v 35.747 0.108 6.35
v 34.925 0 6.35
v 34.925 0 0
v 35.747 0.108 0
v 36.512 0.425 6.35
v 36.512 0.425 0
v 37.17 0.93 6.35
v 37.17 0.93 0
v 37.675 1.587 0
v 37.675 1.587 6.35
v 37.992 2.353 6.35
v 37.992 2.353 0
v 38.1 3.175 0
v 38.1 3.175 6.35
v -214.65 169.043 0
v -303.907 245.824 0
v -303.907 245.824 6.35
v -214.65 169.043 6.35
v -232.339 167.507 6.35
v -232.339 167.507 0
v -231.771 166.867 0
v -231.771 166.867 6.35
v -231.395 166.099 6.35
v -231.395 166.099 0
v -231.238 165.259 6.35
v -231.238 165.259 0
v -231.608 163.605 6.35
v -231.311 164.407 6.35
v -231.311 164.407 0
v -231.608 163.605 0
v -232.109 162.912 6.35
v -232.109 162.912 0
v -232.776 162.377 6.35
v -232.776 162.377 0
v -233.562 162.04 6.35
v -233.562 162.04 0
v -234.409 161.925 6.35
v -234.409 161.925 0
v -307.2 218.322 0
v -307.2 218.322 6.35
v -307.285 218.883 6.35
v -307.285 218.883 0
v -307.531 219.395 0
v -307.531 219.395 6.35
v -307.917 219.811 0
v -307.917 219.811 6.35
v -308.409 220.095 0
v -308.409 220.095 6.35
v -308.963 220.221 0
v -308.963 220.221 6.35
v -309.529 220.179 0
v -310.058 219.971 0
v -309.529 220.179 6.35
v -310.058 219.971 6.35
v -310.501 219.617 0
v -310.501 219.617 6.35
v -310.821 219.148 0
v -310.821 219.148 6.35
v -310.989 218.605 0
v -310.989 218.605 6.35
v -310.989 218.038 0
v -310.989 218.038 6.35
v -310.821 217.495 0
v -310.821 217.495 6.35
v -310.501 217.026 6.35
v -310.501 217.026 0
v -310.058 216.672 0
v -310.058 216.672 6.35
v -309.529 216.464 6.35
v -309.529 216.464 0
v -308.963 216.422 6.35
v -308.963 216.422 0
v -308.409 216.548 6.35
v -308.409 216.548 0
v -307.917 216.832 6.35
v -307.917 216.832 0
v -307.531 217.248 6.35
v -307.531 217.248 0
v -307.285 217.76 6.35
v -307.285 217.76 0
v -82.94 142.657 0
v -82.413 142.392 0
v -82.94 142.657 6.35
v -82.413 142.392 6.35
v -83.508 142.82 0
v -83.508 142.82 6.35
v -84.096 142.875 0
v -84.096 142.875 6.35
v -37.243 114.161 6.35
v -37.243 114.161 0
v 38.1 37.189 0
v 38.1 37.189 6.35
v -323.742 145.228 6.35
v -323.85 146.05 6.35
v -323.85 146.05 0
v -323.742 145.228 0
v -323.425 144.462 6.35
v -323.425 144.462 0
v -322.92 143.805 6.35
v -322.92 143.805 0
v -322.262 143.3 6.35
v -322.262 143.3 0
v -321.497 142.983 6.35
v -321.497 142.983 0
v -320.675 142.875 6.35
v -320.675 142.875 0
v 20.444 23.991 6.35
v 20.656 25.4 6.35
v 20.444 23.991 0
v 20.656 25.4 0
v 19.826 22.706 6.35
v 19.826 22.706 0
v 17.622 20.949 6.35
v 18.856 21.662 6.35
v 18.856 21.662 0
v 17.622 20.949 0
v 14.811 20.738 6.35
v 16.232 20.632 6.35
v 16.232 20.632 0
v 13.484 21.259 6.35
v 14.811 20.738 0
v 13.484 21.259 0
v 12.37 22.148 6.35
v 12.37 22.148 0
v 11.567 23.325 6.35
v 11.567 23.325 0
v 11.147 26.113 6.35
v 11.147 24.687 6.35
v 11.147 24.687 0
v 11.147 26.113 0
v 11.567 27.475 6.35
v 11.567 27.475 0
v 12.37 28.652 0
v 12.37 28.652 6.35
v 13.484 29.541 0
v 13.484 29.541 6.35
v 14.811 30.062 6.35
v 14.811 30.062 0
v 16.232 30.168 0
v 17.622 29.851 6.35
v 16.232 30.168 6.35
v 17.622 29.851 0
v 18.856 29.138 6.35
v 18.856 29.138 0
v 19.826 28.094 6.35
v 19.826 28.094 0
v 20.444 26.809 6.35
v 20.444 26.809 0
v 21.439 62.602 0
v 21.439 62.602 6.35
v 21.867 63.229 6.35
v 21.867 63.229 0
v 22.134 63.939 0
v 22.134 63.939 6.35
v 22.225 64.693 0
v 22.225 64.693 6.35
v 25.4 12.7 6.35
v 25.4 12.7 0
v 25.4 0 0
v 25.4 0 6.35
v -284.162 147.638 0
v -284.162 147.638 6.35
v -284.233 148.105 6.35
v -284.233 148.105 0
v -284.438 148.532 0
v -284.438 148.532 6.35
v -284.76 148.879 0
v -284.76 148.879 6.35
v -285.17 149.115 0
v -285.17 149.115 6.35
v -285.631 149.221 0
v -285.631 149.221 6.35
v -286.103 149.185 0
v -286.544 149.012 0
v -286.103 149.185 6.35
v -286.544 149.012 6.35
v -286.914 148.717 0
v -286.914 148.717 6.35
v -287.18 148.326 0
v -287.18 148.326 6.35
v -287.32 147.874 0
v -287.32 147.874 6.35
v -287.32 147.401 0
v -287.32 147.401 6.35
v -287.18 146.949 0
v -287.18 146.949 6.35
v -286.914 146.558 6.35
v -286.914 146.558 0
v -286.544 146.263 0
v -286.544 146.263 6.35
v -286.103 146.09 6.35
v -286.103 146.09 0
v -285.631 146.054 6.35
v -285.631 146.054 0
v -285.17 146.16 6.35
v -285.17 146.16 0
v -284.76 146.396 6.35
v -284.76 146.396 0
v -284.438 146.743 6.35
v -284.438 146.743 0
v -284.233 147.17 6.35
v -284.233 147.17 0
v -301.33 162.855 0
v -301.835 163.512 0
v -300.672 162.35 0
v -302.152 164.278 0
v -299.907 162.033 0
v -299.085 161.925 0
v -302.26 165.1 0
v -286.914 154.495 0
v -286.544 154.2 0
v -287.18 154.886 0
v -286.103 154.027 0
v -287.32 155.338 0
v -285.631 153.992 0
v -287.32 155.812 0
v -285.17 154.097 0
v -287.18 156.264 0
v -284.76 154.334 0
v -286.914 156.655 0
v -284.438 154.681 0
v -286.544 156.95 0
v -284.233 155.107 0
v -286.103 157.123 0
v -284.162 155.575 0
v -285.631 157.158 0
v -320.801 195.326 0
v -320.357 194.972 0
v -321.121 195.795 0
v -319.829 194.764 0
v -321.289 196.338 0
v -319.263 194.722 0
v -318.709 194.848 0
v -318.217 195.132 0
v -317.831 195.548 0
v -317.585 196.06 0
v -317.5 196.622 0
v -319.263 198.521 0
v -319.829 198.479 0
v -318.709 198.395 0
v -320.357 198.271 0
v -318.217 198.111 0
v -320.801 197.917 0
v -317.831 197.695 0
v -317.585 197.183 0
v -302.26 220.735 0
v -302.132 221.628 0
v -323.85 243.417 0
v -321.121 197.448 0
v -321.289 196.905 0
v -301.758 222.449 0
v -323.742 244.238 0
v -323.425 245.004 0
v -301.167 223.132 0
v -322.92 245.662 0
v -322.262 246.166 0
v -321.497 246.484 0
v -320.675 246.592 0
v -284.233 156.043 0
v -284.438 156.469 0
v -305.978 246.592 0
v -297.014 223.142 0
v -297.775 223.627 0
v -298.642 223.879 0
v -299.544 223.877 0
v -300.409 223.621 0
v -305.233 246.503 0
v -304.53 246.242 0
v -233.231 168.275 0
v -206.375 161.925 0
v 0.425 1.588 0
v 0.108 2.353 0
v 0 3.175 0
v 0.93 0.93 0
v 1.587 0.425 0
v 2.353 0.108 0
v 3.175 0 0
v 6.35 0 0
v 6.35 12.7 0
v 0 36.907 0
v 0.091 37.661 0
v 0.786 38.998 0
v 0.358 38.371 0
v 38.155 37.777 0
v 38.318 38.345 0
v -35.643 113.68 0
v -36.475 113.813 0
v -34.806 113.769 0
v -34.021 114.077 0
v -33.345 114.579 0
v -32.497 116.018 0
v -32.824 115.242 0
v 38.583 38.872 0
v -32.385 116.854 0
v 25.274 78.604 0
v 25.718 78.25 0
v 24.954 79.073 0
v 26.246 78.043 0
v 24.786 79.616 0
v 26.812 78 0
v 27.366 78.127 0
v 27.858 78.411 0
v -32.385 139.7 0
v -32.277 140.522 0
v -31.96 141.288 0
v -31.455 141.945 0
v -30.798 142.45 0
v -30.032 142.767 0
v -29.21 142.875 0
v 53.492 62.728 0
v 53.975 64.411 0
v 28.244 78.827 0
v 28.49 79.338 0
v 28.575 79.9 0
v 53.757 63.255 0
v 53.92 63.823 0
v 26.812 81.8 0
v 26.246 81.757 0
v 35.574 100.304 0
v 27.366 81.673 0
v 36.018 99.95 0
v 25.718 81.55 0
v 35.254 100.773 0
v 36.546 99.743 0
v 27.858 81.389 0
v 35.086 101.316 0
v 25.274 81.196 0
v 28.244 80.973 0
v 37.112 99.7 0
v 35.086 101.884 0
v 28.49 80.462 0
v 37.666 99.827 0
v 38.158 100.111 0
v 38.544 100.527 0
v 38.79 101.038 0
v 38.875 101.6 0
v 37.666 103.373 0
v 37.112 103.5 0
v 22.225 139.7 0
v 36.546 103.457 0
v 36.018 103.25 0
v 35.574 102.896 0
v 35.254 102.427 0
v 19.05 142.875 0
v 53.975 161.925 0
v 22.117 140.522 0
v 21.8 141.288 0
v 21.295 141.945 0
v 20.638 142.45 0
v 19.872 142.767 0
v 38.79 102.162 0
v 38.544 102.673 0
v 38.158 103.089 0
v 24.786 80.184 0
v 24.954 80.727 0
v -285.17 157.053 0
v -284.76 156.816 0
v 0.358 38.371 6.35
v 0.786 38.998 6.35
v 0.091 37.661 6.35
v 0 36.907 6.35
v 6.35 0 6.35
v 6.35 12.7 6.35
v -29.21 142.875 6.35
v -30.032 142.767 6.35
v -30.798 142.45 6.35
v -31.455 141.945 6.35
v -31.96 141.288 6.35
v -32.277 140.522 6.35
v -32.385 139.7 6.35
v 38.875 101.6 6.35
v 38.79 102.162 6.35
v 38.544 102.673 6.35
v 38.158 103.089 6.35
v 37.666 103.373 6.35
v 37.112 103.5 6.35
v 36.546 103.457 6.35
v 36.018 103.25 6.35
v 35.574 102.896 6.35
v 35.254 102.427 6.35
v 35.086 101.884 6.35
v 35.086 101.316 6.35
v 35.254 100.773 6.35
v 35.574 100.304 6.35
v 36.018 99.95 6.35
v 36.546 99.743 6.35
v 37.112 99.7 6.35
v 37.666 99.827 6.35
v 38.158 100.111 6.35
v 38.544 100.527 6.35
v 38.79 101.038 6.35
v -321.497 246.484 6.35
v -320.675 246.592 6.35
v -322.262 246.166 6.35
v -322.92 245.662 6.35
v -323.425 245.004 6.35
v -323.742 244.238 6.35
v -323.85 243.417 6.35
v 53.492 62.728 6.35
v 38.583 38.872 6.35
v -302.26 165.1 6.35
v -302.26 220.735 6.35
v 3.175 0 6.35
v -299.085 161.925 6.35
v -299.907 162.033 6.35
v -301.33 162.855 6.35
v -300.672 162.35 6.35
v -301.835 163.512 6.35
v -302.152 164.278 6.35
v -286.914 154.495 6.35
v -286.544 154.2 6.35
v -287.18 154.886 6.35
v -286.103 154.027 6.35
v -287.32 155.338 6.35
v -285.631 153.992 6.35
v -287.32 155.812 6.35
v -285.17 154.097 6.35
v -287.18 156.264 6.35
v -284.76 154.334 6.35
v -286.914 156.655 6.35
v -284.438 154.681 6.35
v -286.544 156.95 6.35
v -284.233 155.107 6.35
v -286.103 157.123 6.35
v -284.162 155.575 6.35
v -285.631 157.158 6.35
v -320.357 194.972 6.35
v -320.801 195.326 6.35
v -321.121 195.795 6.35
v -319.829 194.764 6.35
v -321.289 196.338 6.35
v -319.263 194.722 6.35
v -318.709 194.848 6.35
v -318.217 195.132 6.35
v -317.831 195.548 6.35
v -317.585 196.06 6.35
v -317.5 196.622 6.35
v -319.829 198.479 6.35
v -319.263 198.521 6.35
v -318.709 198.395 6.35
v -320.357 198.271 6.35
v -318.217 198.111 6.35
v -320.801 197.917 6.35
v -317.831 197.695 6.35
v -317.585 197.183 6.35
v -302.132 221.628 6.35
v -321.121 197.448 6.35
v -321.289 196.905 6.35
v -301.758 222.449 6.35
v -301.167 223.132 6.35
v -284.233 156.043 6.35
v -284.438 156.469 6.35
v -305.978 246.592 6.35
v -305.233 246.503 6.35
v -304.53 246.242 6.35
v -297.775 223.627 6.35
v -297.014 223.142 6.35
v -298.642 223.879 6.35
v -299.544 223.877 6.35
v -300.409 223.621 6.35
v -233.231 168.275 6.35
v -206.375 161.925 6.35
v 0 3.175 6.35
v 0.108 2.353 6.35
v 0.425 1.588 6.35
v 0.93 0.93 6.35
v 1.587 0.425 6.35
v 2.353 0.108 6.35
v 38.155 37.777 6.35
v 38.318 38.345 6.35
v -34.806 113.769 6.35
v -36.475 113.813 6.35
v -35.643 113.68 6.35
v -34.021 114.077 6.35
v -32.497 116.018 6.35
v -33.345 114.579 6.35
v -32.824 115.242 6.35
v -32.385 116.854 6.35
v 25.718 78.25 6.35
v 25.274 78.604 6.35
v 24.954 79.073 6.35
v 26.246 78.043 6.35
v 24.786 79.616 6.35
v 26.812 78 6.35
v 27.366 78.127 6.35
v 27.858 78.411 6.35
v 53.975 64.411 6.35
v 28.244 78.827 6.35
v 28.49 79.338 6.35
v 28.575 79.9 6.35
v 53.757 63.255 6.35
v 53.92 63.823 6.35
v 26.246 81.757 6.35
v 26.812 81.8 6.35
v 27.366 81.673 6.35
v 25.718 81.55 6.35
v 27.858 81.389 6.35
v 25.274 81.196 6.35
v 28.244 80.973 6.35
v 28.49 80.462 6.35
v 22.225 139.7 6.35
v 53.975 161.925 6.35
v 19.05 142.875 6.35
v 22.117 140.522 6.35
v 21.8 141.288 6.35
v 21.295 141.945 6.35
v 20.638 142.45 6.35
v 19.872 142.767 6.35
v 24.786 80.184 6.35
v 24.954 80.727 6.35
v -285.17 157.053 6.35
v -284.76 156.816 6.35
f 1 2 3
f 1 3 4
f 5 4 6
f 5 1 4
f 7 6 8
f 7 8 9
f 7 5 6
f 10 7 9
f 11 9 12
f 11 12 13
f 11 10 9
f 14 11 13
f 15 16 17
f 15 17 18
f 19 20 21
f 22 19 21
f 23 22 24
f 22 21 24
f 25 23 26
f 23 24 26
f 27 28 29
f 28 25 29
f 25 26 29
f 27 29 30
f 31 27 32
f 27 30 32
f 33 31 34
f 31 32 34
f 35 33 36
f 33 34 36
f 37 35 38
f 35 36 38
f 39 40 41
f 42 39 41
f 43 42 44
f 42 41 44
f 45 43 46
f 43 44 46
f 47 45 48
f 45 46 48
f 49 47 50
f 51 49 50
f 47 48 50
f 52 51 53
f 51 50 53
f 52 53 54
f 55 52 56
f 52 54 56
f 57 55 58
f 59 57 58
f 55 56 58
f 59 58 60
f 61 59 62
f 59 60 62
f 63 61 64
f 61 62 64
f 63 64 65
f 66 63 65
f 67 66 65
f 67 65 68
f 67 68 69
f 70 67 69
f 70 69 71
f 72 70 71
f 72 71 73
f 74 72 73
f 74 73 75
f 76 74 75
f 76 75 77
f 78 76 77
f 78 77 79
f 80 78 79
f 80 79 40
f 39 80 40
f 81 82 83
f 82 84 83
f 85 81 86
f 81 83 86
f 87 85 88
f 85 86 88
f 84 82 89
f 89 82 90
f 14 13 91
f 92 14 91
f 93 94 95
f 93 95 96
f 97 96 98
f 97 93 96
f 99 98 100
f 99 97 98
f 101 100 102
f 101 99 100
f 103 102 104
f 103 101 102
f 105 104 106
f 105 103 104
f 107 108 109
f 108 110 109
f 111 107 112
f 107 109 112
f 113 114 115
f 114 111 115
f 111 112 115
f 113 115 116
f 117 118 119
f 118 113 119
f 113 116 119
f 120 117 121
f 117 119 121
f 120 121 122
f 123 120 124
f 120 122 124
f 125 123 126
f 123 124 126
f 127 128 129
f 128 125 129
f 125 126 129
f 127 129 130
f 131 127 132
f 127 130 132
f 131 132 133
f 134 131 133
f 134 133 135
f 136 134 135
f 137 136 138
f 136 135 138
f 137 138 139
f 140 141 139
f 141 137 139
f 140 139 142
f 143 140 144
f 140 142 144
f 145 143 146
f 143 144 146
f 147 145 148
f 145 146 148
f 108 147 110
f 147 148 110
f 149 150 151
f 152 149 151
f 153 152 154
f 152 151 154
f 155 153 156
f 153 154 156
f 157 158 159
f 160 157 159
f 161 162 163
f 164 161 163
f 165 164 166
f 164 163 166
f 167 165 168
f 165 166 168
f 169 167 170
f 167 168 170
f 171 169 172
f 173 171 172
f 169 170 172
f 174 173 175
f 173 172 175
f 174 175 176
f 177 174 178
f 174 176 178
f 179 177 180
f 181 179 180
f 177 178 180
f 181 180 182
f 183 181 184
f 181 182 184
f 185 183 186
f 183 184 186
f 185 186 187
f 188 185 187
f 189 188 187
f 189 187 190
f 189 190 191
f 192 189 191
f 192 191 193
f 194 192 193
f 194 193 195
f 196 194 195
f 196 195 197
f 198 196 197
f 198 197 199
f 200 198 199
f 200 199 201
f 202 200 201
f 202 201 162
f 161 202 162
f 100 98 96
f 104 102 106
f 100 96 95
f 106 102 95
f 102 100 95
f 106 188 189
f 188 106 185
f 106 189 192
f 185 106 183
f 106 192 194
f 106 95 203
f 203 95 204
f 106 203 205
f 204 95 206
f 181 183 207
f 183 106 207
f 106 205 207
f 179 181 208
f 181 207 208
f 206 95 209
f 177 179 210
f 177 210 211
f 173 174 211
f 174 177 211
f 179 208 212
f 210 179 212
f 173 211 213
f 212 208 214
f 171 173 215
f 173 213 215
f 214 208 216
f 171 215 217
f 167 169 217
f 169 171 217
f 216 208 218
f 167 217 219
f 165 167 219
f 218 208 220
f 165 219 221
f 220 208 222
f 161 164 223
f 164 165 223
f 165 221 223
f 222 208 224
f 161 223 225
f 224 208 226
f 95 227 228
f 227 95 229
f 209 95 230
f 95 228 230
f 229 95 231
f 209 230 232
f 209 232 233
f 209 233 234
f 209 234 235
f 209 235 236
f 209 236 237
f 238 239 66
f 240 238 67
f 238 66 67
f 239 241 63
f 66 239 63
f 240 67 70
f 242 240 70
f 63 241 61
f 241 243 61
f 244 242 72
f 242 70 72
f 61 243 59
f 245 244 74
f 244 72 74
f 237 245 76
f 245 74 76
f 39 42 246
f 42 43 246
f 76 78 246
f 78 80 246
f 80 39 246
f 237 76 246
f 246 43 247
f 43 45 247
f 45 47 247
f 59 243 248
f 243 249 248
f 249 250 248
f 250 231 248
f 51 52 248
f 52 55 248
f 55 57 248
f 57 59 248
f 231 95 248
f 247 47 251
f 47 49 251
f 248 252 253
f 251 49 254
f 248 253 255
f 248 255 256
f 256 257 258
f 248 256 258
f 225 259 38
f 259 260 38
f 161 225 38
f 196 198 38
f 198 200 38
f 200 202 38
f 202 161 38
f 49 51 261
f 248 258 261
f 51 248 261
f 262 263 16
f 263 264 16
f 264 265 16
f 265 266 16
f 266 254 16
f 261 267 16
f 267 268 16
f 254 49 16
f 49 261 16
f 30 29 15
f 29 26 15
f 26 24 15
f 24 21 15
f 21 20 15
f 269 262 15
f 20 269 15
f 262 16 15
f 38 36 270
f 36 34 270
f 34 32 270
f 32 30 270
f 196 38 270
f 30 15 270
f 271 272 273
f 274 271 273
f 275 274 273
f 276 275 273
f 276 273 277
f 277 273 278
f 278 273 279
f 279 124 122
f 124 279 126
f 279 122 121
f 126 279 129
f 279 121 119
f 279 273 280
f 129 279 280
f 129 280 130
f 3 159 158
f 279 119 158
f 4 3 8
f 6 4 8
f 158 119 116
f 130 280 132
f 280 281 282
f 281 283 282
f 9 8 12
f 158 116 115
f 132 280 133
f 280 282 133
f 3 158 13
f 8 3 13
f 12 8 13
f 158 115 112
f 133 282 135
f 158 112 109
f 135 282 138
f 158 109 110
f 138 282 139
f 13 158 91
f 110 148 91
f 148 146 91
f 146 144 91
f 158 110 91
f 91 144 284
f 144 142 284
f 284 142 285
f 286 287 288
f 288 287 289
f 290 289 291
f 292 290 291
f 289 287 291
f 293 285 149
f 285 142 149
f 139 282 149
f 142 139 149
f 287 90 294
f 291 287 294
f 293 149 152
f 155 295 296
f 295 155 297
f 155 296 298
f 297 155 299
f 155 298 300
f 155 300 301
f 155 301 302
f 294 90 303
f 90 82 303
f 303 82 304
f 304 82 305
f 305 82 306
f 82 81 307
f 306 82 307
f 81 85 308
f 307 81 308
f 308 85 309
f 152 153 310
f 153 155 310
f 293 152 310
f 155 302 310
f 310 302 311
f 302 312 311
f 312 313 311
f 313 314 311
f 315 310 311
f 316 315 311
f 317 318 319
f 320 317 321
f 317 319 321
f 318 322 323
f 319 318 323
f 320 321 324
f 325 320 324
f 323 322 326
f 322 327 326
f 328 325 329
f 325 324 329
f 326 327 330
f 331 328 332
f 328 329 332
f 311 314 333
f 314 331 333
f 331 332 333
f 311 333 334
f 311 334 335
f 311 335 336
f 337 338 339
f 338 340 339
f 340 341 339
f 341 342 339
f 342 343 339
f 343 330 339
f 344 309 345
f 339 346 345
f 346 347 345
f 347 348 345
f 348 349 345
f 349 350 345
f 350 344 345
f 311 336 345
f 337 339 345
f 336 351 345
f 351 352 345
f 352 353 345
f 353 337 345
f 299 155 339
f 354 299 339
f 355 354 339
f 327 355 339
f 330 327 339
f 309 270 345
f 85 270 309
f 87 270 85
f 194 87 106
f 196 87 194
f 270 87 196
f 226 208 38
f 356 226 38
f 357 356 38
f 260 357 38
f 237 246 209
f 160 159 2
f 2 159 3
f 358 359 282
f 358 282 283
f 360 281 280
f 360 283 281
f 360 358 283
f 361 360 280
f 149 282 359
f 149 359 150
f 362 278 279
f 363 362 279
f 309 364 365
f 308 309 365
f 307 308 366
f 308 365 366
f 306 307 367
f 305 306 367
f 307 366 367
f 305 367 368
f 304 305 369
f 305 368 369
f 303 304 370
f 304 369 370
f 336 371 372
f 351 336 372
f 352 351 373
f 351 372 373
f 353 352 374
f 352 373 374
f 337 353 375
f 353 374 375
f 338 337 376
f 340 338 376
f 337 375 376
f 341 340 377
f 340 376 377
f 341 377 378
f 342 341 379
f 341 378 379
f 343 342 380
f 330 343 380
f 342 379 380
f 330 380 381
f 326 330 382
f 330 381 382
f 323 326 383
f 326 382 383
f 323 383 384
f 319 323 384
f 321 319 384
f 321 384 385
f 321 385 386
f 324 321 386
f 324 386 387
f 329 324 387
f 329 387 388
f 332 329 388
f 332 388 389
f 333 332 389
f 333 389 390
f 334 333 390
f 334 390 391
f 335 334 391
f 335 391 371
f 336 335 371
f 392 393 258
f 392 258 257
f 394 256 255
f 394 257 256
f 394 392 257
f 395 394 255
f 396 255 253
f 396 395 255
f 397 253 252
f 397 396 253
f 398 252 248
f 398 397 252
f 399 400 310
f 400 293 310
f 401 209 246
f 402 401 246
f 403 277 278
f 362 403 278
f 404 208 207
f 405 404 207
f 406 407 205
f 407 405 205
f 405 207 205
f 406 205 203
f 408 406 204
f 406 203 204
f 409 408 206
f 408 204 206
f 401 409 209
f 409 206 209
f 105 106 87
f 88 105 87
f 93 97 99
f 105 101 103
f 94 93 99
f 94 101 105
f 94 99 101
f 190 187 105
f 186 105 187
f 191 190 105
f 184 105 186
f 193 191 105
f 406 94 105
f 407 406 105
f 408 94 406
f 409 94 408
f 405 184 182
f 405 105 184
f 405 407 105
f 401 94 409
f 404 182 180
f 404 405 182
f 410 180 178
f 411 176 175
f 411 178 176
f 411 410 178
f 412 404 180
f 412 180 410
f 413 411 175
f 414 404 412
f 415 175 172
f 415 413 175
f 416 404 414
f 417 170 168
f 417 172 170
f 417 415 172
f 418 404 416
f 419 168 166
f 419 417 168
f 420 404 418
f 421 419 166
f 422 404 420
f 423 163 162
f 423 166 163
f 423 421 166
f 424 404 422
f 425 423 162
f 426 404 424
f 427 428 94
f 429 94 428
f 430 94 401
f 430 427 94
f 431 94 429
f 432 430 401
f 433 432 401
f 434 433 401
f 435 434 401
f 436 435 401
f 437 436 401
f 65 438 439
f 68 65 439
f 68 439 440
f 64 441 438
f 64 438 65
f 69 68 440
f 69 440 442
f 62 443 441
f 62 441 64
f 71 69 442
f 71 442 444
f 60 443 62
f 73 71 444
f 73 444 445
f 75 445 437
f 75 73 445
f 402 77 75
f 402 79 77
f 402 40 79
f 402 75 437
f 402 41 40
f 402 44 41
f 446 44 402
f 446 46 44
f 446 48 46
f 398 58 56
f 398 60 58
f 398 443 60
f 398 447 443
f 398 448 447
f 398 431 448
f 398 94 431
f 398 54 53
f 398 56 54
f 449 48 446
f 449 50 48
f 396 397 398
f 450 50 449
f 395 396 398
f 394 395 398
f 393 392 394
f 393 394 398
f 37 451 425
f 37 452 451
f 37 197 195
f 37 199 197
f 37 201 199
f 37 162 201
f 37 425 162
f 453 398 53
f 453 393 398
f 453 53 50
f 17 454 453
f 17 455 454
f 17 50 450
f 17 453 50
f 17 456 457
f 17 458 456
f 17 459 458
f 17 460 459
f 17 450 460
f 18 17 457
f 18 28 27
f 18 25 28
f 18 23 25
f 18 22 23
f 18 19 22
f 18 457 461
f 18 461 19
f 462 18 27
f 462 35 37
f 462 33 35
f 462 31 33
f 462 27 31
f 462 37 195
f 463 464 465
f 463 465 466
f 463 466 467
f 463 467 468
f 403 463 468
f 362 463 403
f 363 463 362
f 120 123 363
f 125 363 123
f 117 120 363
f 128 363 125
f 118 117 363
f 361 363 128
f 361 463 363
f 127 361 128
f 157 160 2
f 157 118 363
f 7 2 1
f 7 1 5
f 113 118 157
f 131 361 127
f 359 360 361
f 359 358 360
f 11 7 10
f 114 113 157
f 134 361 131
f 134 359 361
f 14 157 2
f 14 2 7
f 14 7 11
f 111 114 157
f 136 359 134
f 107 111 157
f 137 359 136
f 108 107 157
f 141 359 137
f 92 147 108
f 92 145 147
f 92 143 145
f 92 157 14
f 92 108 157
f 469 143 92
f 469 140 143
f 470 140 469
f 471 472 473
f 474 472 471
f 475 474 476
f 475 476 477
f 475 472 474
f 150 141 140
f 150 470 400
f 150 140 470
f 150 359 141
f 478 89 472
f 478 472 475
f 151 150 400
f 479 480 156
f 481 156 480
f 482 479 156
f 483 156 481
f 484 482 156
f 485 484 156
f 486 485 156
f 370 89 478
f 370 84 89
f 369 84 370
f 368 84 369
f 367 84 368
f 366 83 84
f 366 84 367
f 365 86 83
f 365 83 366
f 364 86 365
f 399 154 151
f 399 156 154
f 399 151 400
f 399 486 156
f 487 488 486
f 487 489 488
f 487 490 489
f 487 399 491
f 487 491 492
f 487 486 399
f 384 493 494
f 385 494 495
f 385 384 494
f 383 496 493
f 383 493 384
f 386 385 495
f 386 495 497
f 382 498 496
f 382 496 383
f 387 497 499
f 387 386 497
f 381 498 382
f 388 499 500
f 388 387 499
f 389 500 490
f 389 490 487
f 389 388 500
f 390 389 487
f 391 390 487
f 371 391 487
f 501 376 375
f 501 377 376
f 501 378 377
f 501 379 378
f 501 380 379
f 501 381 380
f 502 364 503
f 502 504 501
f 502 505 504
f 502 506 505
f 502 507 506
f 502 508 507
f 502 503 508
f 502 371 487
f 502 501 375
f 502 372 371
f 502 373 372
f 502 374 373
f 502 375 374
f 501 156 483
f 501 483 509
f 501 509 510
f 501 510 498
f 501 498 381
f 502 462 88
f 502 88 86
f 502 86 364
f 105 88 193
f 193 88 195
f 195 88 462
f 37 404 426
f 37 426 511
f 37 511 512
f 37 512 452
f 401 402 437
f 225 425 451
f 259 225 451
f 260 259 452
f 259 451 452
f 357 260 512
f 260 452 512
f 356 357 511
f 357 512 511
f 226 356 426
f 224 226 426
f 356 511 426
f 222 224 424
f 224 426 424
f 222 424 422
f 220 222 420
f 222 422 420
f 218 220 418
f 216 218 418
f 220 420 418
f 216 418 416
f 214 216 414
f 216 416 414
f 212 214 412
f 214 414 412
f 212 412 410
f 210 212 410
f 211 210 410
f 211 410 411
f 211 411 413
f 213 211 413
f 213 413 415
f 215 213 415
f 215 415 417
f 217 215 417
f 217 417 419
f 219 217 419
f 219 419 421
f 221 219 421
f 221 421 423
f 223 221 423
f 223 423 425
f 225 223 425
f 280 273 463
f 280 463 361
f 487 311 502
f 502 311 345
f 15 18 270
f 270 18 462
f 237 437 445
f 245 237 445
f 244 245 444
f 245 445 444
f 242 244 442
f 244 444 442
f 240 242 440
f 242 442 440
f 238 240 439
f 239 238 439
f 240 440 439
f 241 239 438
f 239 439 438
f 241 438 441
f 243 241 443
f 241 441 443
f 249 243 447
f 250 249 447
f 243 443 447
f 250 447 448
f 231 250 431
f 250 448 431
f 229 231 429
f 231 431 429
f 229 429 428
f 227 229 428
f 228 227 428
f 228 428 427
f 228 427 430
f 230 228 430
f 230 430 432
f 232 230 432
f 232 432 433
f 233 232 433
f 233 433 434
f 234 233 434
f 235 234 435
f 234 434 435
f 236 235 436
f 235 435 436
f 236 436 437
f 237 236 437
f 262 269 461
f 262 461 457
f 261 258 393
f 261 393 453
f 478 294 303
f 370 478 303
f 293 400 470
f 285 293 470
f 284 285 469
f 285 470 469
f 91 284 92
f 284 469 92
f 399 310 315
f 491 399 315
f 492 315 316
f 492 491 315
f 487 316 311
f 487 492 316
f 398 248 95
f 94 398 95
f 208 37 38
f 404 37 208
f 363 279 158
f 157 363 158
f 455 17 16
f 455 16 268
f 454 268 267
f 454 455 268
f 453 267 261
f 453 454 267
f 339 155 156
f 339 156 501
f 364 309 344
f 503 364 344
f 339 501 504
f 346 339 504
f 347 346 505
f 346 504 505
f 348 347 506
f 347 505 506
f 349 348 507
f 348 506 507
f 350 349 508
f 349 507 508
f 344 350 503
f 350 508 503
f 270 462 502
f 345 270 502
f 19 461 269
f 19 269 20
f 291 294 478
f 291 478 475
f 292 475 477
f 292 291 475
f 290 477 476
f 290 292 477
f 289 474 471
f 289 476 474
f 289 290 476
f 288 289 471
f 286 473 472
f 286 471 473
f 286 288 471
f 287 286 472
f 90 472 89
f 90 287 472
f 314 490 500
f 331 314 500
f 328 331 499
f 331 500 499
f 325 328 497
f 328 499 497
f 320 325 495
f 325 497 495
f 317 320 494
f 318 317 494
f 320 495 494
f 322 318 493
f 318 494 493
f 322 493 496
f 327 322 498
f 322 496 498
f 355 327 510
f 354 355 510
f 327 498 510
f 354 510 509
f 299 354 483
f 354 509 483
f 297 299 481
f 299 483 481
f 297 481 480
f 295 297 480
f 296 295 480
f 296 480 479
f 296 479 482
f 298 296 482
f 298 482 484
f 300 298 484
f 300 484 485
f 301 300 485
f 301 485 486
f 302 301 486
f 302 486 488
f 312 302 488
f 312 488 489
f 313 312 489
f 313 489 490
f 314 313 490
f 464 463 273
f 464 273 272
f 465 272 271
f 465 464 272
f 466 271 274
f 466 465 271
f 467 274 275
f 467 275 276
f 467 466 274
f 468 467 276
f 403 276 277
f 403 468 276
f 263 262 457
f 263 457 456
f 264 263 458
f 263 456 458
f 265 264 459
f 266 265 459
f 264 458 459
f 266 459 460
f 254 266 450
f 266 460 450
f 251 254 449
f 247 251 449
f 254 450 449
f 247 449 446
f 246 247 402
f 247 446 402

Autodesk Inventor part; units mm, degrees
ref_plane "YZ Plane" through (0, 0, 0) normal (1, 0, 0) x (0, 1, 0)
sketch "Sketch1" plane through (0, 0, 0) normal (0, 0, 1) x (1, 0, 0)
  line L0 (0, 0) -> (6.35, 0)
  line L1 (6.35, 0) -> (6.35, 12.7)
  line L2 (6.35, 12.7) -> (25.4, 12.7)
  line L3 (25.4, 12.7) -> (25.4, 0)
  line L4 (25.4, 0) -> (31.75, 0)
  circle A0 centre (15.875, 25.4) radius 4.7815
  line L5 (-323.85, 246.5917) -> (-305.435, 246.5917)
  line L6 (-323.85, 142.875) -> (-83.185, 142.875)
  line L7 (-83.185, 142.875) -> (-37.2427, 114.1611)
  line L8 (-32.385, 142.875) -> (22.225, 142.875)
  line L9 (-32.385, 116.8535) -> (-32.385, 142.875)
  arc A1 (-37.2427, 114.1611) -> (-32.385, 116.8535) centre (-35.56, 116.8535) ccw
  line L10 (-323.85, 168.275) -> (-323.85, 246.5917)
  line L11 (-323.85, 246.5917) -> (-304.8, 246.5917)
  line L12 (-323.85, 168.275) -> (-323.85, 142.875)
  line L13 (0, 0) -> (0, 38.1)
  line L14 (53.975, -21.4734) -> (53.975, 330.2514) construction
  line L15 (0, 38.1) -> (22.225, 63.5)
  line L16 (22.225, 63.5) -> (22.225, 142.875)
  line L17 (53.975, 63.5) -> (53.975, 168.275)
  line L18 (53.975, 63.5) -> (53.975, 168.275)
  line L19 (22.225, 63.5) -> (22.225, 142.875)
  line L20 (-32.385, 142.875) -> (22.225, 142.875)
  line L21 (-83.185, 142.875) -> (-323.85, 142.875)
  line L22 (31.75, 0) -> (38.1, 0)
  line L23 (38.1, 0) -> (38.1, 38.1)
  line L24 (38.1, 38.1) -> (53.975, 63.5)
  line L25 (38.1, 0) -> (31.75, 0)
  line L26 (-304.8, 246.5917) -> (-213.7569, 168.275)
  line L27 (-233.2314, 168.275) -> (-302.26, 227.6544)
  line L28 (53.975, 168.275) -> (-213.7569, 168.275)
  line L29 (-233.2314, 168.275) -> (-302.26, 168.275)
  line L30 (-302.26, 168.275) -> (-233.2314, 168.275)
  line L31 (-213.7569, 168.275) -> (53.975, 168.275)
  circle A2 centre (-285.75, 149.225) radius 1.5875
  circle A3 centre (-285.75, 161.925) radius 1.5875
  line L32 (-302.26, 168.275) -> (-302.26, 227.6544)
  point P0 (-32.385, 111.125)
  point P1 (-359.41, 168.275)
  dimension "d0" = 6.35
  dimension "d1" = 12.7
  dimension "d2" = 19.05
  dimension "d3" = 6.35
  dimension "d4" = 12.7
  dimension "d5" = 9.5631
  dimension "d6" = 12.7
  dimension "d8" = 377.825
  dimension "d17" = 103.7167
  dimension "d19" = 9.525
  dimension "d25" = 31.75
  dimension "d26" = 3.175
  dimension "d27" = 50.8
  dimension "d30" = 19.05
  dimension "d63" = 38.1
  dimension "d68" = 0
  dimension "d69" = 54.61
  dimension "d71" = 22.225
  dimension "d72" = 0
  dimension "d74" = 79.375
  dimension "d76" = 240.665
  dimension "d87" = 6.35
  dimension "d88" = 38.1
  dimension "d89" = 25.4
  dimension "d91" = 25.4
  dimension "d94" = 12.7
  dimension "d97" = 40.703
  dimension "d98" = 267.7319
  dimension "d109" = 3.175
  dimension "d110" = 3.175
  dimension "d111" = 38.1
  dimension "d112" = 38.1
  dimension "d113" = 6.35
  dimension "d114" = 6.35
  dimension "d135" = 25.4
  dimension "d136" = 25.4
  dimension "d143" = 21.59
ref_plane "Work Plane4" through (0, 0, 9.525) normal (0, 0, 1) x (1, 0, 0)
ref_plane "Work Plane3" through (0, 0, 9.525) normal (0, 0, 1) x (1, 0, 0)
extrude "Extrusion9" add sketch "Sketch1" along normal blind 6.35 contours L13 L15 L16 L8 L9 A1 L7 L6 L12 L10 L5 L11 L26 L28 L17 L24 L23 L22 L4 L3 L2 L1 L0 | A2 | A3
sketch "Sketch8" plane through (0, 0, 6.35) normal (0, 0, 1) x (1, 0, 0)
  line L0 (-304.8, 246.5917) -> (-323.85, 246.5917) projected
  line L1 (-323.85, 246.5917) -> (-323.85, 142.875) projected
  circle A0 centre (-309.105, 218.3215) radius 1.905
  circle A1 centre (-319.405, 196.6215) radius 1.905
  line L2 (-32.385, 142.875) -> (22.225, 142.875) projected
  line L3 (22.225, 142.875) -> (22.225, 63.5) projected
  circle A2 centre (36.97, 101.6) radius 1.905
  circle A3 centre (26.67, 79.9) radius 1.905
  dimension "d101" = 3.81
  dimension "d102" = 3.81
  dimension "d104" = 28.2702
  dimension "d105" = 4.445
  dimension "d147" = 21.7
  dimension "d148" = 10.3
  dimension "d149" = 3.81
  dimension "d150" = 3.81
  dimension "d151" = 21.7
  dimension "d152" = 10.3
  dimension "d153" = 41.275
  dimension "d154" = 4.445
extrude "Extrusion10" cut sketch "Sketch8" against normal blind 6.35
sketch "Sketch9" plane through (0, 0, 6.35) normal (0, 0, 1) x (1, 0, 0)
  line L0 (-323.85, 246.5917) -> (-323.85, 142.875) projected
  line L1 (-323.85, 142.875) -> (-83.185, 142.875) projected
  circle A0 centre (-285.75, 155.575) radius 1.5875
  circle A1 centre (-285.75, 147.6375) radius 1.5875
  dimension "d115" = 3.175
  dimension "d116" = 3.175
  dimension "d117" = 38.1
  dimension "d118" = 38.1
  dimension "d119" = 4.7625
  dimension "d124" = 7.9375
extrude "Extrusion11" cut sketch "Sketch9" against normal blind 6.35
fillet "Fillet8" radius 3.175 14 edges at (-304.8, 246.5917, 3.175) (-323.85, 246.5917, 3.175) (-213.7569, 168.275, 3.175) (53.975, 168.275, 3.175) (53.975, 63.5, 3.175) (38.1, 38.1, 3.175) (0, 0, 3.175) (0, 38.1, 3.175) (22.225, 142.875, 3.175) (22.225, 63.5, 3.175) (-83.185, 142.875, 3.175) (-32.385, 142.875, 3.175) (-323.85, 142.875, 3.175) (-302.26, 227.6544, 3.175)
fillet "Fillet9" radius 3.175 1 edges at (38.1, 0, 3.175)
sketch "Sketch11" plane through (0, 0, 6.35) normal (0, 0, 1) x (1, 0, 0)
  line L0 (53.975, 64.4106) -> (53.975, 165.1) projected
  arc A0 (53.975, 165.1) -> (50.8, 168.275) centre (50.8, 165.1) ccw projected
  line L1 (50.8, 168.275) -> (-212.5792, 168.275) projected
  arc A1 (-214.6497, 169.043) -> (-212.5792, 168.275) centre (-212.5792, 171.45) ccw projected
  line L2 (-233.2314, 168.275) -> (-302.26, 168.275) projected
  line L3 (-297.0145, 223.1421) -> (-233.2314, 168.275) projected
  line L4 (-302.26, 161.925) -> (-233.2314, 161.925)
  line L5 (-233.2314, 168.275) -> (-225.8496, 161.925)
  line L6 (-225.8496, 161.925) -> (-233.2314, 161.925)
  line L7 (-214.6497, 169.043) -> (-206.375, 161.925)
  line L8 (-206.375, 161.925) -> (53.975, 161.925)
  line L9 (-302.26, 168.275) -> (-302.26, 161.925)
  point P0 (0, 0)
  dimension "d139" = 6.35
  dimension "d144" = 6.35
extrude "Extrusion13" cut sketch "Sketch11" against normal blind 25.4
fillet "Fillet11" radius 3.175 2 edges at (-302.26, 161.925, 3.175) (-225.8496, 161.925, 3.175)
properties part number "Rebuild Left Climber Hook" material "Aluminum 6061"
